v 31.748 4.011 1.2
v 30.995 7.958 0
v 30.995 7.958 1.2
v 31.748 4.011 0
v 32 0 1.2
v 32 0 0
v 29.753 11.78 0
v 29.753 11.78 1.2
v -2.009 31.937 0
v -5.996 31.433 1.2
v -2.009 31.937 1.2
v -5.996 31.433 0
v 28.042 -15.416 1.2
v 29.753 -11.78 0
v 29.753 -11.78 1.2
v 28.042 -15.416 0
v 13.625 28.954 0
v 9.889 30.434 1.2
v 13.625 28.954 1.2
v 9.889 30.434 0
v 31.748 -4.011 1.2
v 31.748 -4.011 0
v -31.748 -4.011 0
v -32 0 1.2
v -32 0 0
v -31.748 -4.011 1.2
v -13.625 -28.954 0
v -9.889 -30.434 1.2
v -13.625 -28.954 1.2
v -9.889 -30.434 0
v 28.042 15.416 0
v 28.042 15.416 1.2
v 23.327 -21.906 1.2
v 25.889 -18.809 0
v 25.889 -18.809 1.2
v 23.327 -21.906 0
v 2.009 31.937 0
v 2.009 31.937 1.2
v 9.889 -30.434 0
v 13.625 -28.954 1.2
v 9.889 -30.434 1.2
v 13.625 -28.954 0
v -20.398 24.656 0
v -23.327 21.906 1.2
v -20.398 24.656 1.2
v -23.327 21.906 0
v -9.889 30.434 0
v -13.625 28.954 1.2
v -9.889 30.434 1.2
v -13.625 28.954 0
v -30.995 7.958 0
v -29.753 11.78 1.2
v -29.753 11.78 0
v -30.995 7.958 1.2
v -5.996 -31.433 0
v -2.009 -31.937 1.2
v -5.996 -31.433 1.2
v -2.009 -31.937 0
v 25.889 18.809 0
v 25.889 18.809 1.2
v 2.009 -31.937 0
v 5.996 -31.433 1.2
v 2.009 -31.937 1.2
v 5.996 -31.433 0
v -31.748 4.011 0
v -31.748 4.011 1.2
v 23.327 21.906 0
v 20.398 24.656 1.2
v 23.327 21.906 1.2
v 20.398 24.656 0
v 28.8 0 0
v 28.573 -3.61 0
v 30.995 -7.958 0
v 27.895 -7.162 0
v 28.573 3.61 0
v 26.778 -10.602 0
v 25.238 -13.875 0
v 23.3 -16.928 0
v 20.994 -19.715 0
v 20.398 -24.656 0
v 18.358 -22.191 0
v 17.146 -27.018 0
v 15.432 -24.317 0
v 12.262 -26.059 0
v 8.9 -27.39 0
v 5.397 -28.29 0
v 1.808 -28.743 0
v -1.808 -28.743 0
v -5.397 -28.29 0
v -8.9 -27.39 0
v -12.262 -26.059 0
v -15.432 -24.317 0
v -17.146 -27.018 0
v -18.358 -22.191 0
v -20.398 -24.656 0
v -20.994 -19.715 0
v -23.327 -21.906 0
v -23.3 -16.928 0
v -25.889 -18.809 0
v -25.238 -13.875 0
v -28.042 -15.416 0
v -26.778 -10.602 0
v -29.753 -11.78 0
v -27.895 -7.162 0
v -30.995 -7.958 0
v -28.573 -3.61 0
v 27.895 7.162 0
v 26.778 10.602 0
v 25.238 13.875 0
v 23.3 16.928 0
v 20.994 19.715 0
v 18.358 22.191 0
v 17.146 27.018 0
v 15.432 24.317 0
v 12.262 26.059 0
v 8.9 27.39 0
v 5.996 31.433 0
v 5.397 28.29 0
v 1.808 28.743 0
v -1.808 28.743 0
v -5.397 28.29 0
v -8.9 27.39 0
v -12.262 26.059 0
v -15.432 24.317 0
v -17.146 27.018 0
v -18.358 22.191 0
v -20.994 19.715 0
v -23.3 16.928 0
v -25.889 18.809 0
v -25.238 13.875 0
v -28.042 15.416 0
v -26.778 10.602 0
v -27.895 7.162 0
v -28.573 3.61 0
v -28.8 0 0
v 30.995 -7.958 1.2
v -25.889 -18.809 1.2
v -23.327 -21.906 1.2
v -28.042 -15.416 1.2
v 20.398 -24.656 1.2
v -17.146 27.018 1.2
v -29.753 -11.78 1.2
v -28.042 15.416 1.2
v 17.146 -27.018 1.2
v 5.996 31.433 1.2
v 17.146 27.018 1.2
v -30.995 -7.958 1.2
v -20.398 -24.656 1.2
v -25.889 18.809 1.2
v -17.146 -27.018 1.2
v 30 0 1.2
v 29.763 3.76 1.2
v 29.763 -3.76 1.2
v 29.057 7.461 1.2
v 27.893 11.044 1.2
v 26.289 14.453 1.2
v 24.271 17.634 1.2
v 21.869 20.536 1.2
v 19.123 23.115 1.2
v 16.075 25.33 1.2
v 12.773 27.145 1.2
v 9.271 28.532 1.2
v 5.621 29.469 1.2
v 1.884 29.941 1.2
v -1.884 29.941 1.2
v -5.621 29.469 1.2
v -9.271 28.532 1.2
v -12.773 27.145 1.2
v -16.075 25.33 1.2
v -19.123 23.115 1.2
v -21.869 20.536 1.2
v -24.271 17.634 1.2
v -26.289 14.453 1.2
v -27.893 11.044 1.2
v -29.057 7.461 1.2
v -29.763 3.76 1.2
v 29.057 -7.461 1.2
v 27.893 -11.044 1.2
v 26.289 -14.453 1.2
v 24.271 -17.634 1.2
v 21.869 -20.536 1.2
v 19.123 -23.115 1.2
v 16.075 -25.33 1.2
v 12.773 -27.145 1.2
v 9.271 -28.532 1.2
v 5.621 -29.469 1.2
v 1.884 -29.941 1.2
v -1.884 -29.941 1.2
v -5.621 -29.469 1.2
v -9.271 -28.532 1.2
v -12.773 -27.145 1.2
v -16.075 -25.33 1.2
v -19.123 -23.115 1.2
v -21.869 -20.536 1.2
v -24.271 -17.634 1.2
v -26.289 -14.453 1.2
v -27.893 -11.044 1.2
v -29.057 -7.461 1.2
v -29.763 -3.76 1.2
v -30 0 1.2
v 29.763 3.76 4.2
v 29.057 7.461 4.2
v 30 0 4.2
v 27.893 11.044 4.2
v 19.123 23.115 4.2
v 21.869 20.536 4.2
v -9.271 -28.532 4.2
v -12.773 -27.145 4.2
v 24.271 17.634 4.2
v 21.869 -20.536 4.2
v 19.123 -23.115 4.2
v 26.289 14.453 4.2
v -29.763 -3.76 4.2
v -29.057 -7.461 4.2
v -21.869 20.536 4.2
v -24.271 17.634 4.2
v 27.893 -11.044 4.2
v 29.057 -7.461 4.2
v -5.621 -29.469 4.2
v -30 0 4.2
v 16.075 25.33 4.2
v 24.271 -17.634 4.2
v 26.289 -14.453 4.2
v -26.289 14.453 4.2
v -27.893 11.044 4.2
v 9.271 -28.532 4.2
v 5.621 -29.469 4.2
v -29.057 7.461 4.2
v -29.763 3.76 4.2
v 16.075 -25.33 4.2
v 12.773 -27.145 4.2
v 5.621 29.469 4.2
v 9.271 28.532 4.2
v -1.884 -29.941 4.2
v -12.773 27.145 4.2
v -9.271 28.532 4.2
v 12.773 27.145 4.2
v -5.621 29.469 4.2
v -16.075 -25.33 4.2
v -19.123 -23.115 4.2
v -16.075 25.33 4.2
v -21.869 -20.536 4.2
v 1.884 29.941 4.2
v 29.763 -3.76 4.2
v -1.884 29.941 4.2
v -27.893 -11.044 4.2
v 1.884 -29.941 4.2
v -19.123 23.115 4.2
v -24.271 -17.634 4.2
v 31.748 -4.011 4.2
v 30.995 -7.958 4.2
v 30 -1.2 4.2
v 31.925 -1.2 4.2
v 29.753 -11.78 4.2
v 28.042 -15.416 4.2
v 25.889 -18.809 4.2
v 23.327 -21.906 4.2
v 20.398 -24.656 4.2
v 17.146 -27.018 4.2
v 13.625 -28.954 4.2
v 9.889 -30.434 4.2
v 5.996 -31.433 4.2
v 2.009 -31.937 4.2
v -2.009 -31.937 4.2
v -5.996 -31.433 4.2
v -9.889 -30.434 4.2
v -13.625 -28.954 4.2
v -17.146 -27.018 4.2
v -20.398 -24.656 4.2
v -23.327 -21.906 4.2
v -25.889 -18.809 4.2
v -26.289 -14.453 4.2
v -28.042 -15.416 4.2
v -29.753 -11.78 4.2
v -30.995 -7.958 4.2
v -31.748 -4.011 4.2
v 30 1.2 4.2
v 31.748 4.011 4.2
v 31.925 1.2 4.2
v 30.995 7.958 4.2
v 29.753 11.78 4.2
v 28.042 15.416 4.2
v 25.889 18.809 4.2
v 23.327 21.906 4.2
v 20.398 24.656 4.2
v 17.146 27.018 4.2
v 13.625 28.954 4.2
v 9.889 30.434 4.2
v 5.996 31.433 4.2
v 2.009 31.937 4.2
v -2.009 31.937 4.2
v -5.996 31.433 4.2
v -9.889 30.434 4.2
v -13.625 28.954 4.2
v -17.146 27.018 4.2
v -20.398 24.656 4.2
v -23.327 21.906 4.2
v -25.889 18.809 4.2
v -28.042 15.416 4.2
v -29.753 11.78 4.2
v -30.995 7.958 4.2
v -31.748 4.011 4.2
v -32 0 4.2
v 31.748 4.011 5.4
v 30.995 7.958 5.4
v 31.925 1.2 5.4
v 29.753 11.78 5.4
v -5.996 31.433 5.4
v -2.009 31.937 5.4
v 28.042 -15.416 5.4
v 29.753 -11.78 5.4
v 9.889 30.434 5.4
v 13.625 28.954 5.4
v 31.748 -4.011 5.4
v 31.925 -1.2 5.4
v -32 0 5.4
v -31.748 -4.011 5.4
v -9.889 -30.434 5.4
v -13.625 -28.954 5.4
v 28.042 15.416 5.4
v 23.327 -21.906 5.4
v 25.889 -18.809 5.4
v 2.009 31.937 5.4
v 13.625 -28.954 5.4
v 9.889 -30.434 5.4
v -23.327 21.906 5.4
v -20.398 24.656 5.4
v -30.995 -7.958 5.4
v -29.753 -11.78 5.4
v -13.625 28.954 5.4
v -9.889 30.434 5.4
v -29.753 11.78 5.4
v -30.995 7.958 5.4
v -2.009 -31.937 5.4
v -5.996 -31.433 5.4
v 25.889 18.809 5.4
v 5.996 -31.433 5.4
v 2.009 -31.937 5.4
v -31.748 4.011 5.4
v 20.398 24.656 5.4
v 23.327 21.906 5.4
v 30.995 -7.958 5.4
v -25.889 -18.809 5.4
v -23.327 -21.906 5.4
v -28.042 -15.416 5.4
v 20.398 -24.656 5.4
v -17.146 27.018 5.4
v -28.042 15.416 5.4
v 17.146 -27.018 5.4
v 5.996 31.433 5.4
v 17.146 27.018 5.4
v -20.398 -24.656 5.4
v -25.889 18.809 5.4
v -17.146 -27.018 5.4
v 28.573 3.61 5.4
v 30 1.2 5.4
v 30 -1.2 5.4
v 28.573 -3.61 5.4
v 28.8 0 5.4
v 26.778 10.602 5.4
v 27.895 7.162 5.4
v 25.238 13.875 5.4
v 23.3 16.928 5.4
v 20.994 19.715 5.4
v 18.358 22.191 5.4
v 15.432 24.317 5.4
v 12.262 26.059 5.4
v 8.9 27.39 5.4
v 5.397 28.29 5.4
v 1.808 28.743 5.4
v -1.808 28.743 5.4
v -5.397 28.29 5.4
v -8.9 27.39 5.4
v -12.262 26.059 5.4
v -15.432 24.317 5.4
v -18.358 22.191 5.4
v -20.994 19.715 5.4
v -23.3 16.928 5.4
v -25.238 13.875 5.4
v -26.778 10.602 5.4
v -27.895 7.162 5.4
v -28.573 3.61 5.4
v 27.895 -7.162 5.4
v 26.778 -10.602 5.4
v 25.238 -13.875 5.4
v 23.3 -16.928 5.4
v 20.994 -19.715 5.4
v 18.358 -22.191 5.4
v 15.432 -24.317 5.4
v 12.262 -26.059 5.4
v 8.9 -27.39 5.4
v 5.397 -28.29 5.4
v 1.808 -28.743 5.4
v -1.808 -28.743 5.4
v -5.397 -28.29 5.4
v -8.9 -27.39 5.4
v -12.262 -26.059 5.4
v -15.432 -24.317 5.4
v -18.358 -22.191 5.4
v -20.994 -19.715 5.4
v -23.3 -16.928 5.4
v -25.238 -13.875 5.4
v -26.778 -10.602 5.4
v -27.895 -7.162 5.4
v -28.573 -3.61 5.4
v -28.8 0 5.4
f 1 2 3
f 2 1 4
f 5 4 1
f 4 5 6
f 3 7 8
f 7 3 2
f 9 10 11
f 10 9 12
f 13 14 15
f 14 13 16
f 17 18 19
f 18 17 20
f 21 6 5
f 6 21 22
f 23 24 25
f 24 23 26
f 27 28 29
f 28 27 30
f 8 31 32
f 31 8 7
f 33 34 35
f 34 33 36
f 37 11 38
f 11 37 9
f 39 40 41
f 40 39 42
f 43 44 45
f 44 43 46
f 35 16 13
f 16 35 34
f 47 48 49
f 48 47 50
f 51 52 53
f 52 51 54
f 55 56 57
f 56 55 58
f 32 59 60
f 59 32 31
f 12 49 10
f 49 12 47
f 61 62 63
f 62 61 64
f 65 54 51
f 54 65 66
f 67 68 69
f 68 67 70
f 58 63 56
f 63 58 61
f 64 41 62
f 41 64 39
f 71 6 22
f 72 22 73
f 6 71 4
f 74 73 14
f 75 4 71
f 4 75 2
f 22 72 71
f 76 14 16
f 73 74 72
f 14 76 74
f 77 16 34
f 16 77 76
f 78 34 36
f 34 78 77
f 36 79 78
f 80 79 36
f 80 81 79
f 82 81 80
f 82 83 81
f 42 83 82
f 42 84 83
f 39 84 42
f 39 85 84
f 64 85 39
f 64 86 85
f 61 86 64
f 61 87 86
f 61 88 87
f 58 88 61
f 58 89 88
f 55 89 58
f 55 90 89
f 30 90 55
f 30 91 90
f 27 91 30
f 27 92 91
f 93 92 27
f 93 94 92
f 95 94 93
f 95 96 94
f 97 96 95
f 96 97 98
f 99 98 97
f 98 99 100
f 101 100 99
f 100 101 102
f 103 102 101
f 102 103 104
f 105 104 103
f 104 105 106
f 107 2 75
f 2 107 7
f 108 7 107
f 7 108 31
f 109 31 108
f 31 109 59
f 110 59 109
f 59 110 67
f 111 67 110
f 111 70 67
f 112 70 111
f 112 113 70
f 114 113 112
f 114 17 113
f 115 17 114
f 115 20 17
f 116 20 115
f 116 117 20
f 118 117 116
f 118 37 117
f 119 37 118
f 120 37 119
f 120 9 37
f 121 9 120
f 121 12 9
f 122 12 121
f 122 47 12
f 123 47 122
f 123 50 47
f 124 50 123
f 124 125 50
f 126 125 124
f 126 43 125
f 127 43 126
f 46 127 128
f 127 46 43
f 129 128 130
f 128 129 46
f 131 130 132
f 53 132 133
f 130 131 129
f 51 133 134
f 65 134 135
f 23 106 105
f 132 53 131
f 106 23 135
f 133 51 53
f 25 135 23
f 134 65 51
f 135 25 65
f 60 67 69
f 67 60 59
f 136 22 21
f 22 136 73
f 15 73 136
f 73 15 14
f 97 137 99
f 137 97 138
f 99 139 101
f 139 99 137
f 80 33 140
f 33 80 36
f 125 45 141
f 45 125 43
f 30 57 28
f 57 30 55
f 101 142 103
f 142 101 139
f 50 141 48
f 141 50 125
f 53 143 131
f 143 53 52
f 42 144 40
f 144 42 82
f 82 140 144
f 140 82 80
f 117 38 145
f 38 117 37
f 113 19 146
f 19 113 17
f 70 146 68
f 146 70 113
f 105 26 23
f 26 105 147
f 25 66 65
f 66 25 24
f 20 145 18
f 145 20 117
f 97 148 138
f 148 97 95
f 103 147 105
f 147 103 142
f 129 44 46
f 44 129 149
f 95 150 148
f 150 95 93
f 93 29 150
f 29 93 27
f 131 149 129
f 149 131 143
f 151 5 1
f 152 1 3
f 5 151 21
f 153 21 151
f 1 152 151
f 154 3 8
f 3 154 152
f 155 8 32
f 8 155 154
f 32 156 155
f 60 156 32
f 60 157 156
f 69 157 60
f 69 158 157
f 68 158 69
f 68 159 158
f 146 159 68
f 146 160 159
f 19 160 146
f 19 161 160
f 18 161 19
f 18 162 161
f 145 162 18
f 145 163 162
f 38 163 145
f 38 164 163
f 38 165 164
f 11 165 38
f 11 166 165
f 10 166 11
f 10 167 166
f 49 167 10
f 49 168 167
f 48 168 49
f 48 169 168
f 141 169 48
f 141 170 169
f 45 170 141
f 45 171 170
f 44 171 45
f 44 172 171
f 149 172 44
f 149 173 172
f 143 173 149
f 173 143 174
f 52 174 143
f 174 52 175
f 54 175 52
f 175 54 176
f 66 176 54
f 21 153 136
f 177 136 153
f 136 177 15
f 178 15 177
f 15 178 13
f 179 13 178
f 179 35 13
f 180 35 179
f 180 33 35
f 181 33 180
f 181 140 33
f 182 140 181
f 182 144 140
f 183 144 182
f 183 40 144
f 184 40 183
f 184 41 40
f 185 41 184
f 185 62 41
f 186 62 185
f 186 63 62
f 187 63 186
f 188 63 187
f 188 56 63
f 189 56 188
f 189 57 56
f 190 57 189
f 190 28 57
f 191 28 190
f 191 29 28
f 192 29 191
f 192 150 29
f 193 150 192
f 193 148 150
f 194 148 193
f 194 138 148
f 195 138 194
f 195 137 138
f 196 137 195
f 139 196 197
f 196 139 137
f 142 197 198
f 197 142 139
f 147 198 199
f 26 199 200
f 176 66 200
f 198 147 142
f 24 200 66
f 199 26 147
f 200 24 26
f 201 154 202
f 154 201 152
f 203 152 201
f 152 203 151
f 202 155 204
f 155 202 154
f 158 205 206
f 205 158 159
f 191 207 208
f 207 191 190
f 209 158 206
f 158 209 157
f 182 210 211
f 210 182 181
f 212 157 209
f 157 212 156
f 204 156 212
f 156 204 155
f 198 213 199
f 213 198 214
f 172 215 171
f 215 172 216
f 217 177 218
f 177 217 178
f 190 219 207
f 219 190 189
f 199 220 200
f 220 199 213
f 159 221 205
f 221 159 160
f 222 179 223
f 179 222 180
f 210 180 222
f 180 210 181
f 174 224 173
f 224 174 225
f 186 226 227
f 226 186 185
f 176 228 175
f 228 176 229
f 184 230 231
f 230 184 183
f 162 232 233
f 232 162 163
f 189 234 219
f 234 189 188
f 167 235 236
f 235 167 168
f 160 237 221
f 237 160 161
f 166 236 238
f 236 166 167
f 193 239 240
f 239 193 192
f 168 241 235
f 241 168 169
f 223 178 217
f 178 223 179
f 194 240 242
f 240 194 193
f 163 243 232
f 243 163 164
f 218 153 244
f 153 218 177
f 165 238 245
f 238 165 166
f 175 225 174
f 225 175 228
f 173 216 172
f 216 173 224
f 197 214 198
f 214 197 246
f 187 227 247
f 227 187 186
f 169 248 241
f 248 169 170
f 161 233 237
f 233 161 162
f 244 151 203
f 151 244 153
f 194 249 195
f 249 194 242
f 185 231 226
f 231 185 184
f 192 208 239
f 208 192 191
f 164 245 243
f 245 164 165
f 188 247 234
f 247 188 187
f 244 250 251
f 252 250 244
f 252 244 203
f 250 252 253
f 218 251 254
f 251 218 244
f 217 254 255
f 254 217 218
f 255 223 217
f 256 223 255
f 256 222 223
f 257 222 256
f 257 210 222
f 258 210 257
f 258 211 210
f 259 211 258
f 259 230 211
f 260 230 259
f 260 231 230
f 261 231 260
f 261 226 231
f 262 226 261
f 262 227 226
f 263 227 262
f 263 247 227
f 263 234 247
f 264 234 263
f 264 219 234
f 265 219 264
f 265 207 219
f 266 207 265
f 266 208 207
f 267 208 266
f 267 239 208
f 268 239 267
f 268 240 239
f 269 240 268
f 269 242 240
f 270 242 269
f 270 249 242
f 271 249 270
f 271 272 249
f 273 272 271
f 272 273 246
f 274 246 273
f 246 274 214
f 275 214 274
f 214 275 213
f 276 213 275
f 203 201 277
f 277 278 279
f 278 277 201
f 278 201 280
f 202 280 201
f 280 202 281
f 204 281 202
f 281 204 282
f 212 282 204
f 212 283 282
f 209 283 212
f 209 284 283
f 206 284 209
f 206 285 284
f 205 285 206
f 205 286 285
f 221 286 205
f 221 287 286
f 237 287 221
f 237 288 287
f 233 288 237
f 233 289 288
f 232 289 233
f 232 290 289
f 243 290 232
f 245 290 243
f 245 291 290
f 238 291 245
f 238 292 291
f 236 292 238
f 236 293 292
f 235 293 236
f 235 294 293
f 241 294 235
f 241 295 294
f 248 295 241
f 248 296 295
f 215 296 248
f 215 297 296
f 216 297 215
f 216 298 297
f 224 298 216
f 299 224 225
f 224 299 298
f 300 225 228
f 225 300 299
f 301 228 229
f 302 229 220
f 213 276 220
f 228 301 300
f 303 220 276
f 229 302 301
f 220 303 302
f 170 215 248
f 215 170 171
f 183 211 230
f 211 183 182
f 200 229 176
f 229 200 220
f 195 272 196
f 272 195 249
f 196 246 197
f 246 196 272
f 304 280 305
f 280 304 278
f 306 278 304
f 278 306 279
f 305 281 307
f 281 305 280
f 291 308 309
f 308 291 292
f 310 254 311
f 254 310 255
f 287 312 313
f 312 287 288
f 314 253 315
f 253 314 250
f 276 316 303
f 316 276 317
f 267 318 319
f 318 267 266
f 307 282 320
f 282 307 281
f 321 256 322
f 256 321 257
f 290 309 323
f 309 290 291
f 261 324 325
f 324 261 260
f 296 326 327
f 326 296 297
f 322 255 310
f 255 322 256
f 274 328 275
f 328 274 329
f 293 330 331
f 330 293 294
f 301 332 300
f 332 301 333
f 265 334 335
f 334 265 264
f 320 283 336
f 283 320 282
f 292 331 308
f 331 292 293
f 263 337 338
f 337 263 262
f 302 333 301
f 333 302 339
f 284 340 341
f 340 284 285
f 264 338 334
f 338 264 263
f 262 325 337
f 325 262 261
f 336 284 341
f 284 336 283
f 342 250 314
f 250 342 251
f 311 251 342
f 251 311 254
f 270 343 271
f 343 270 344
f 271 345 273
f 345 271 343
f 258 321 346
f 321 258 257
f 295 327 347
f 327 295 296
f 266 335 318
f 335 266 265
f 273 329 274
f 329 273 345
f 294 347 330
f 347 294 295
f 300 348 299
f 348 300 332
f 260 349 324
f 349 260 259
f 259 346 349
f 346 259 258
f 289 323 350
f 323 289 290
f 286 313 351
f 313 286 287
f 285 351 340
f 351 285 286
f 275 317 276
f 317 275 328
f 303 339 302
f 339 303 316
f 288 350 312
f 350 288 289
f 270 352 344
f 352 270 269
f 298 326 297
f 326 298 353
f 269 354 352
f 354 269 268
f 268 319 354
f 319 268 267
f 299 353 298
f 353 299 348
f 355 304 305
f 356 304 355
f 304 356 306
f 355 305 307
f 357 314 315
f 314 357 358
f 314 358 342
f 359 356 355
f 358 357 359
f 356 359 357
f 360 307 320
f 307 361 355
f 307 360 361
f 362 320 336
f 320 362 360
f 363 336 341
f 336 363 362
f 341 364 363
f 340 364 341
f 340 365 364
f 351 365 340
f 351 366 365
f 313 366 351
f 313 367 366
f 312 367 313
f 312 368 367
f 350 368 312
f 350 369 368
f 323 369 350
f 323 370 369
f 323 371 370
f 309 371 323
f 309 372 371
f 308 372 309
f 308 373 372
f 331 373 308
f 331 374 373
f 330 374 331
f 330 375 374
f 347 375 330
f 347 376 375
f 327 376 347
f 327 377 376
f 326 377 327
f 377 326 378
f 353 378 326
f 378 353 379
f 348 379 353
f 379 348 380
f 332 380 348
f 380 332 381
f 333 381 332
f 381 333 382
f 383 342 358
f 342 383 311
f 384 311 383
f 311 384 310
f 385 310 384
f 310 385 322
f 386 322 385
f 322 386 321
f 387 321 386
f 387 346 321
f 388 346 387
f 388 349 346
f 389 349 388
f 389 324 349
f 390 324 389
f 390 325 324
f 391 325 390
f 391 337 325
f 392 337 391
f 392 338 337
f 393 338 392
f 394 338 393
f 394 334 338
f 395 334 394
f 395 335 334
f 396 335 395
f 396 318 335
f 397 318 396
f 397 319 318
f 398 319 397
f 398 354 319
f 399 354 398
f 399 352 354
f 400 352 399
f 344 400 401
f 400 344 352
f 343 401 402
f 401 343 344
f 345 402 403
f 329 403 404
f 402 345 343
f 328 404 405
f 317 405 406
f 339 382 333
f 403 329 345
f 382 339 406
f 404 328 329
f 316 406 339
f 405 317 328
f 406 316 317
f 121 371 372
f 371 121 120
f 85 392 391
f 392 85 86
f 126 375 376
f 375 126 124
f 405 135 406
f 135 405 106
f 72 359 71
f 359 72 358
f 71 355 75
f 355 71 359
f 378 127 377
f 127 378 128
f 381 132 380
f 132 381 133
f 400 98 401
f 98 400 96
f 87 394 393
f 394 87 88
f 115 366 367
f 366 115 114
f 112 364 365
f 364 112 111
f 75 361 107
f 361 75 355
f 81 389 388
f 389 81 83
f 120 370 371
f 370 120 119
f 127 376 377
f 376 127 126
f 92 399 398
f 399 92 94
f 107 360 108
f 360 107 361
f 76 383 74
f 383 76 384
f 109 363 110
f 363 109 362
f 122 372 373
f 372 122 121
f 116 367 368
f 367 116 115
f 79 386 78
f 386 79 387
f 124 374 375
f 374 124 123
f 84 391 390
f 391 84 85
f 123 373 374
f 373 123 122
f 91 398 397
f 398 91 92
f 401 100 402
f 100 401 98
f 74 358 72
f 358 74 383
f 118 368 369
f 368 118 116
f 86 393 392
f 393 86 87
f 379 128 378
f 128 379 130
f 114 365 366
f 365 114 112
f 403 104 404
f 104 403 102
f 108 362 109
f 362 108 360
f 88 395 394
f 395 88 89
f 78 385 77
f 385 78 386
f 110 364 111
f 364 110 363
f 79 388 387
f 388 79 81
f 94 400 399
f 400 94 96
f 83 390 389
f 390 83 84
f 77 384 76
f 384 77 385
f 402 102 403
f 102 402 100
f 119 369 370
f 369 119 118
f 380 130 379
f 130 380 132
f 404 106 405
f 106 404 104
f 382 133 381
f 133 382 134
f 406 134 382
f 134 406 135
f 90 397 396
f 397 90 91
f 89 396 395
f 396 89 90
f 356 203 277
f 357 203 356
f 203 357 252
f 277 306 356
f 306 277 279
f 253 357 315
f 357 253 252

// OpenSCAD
// Copyright 2018 Marcos Del Sol Vives
// SPDX-License-Identifier: ISC

// Detail
$fn=50;

// Thickness of the walls
wallsize = 1.2;

// Inner coil radius
// Note it's not the radius of the 3D plastic support, but the coil's
iradius = 30;

// Outer radius
oradius = 32;

// Height of the coil
height = 3;

difference() {
    union() {
        cylinder(r=oradius, h=wallsize);
        translate([0, 0, wallsize]) {
            cylinder(r=iradius, h=height);
        }
        translate([0, 0, wallsize+height]) {
            cylinder(r=oradius, h=wallsize);
        }
    }
    cylinder(r=iradius-wallsize, h=2*wallsize+height);
    translate([iradius, -wallsize, wallsize+height]) {
        cube([oradius-iradius, wallsize*2, wallsize]);
    }
}
